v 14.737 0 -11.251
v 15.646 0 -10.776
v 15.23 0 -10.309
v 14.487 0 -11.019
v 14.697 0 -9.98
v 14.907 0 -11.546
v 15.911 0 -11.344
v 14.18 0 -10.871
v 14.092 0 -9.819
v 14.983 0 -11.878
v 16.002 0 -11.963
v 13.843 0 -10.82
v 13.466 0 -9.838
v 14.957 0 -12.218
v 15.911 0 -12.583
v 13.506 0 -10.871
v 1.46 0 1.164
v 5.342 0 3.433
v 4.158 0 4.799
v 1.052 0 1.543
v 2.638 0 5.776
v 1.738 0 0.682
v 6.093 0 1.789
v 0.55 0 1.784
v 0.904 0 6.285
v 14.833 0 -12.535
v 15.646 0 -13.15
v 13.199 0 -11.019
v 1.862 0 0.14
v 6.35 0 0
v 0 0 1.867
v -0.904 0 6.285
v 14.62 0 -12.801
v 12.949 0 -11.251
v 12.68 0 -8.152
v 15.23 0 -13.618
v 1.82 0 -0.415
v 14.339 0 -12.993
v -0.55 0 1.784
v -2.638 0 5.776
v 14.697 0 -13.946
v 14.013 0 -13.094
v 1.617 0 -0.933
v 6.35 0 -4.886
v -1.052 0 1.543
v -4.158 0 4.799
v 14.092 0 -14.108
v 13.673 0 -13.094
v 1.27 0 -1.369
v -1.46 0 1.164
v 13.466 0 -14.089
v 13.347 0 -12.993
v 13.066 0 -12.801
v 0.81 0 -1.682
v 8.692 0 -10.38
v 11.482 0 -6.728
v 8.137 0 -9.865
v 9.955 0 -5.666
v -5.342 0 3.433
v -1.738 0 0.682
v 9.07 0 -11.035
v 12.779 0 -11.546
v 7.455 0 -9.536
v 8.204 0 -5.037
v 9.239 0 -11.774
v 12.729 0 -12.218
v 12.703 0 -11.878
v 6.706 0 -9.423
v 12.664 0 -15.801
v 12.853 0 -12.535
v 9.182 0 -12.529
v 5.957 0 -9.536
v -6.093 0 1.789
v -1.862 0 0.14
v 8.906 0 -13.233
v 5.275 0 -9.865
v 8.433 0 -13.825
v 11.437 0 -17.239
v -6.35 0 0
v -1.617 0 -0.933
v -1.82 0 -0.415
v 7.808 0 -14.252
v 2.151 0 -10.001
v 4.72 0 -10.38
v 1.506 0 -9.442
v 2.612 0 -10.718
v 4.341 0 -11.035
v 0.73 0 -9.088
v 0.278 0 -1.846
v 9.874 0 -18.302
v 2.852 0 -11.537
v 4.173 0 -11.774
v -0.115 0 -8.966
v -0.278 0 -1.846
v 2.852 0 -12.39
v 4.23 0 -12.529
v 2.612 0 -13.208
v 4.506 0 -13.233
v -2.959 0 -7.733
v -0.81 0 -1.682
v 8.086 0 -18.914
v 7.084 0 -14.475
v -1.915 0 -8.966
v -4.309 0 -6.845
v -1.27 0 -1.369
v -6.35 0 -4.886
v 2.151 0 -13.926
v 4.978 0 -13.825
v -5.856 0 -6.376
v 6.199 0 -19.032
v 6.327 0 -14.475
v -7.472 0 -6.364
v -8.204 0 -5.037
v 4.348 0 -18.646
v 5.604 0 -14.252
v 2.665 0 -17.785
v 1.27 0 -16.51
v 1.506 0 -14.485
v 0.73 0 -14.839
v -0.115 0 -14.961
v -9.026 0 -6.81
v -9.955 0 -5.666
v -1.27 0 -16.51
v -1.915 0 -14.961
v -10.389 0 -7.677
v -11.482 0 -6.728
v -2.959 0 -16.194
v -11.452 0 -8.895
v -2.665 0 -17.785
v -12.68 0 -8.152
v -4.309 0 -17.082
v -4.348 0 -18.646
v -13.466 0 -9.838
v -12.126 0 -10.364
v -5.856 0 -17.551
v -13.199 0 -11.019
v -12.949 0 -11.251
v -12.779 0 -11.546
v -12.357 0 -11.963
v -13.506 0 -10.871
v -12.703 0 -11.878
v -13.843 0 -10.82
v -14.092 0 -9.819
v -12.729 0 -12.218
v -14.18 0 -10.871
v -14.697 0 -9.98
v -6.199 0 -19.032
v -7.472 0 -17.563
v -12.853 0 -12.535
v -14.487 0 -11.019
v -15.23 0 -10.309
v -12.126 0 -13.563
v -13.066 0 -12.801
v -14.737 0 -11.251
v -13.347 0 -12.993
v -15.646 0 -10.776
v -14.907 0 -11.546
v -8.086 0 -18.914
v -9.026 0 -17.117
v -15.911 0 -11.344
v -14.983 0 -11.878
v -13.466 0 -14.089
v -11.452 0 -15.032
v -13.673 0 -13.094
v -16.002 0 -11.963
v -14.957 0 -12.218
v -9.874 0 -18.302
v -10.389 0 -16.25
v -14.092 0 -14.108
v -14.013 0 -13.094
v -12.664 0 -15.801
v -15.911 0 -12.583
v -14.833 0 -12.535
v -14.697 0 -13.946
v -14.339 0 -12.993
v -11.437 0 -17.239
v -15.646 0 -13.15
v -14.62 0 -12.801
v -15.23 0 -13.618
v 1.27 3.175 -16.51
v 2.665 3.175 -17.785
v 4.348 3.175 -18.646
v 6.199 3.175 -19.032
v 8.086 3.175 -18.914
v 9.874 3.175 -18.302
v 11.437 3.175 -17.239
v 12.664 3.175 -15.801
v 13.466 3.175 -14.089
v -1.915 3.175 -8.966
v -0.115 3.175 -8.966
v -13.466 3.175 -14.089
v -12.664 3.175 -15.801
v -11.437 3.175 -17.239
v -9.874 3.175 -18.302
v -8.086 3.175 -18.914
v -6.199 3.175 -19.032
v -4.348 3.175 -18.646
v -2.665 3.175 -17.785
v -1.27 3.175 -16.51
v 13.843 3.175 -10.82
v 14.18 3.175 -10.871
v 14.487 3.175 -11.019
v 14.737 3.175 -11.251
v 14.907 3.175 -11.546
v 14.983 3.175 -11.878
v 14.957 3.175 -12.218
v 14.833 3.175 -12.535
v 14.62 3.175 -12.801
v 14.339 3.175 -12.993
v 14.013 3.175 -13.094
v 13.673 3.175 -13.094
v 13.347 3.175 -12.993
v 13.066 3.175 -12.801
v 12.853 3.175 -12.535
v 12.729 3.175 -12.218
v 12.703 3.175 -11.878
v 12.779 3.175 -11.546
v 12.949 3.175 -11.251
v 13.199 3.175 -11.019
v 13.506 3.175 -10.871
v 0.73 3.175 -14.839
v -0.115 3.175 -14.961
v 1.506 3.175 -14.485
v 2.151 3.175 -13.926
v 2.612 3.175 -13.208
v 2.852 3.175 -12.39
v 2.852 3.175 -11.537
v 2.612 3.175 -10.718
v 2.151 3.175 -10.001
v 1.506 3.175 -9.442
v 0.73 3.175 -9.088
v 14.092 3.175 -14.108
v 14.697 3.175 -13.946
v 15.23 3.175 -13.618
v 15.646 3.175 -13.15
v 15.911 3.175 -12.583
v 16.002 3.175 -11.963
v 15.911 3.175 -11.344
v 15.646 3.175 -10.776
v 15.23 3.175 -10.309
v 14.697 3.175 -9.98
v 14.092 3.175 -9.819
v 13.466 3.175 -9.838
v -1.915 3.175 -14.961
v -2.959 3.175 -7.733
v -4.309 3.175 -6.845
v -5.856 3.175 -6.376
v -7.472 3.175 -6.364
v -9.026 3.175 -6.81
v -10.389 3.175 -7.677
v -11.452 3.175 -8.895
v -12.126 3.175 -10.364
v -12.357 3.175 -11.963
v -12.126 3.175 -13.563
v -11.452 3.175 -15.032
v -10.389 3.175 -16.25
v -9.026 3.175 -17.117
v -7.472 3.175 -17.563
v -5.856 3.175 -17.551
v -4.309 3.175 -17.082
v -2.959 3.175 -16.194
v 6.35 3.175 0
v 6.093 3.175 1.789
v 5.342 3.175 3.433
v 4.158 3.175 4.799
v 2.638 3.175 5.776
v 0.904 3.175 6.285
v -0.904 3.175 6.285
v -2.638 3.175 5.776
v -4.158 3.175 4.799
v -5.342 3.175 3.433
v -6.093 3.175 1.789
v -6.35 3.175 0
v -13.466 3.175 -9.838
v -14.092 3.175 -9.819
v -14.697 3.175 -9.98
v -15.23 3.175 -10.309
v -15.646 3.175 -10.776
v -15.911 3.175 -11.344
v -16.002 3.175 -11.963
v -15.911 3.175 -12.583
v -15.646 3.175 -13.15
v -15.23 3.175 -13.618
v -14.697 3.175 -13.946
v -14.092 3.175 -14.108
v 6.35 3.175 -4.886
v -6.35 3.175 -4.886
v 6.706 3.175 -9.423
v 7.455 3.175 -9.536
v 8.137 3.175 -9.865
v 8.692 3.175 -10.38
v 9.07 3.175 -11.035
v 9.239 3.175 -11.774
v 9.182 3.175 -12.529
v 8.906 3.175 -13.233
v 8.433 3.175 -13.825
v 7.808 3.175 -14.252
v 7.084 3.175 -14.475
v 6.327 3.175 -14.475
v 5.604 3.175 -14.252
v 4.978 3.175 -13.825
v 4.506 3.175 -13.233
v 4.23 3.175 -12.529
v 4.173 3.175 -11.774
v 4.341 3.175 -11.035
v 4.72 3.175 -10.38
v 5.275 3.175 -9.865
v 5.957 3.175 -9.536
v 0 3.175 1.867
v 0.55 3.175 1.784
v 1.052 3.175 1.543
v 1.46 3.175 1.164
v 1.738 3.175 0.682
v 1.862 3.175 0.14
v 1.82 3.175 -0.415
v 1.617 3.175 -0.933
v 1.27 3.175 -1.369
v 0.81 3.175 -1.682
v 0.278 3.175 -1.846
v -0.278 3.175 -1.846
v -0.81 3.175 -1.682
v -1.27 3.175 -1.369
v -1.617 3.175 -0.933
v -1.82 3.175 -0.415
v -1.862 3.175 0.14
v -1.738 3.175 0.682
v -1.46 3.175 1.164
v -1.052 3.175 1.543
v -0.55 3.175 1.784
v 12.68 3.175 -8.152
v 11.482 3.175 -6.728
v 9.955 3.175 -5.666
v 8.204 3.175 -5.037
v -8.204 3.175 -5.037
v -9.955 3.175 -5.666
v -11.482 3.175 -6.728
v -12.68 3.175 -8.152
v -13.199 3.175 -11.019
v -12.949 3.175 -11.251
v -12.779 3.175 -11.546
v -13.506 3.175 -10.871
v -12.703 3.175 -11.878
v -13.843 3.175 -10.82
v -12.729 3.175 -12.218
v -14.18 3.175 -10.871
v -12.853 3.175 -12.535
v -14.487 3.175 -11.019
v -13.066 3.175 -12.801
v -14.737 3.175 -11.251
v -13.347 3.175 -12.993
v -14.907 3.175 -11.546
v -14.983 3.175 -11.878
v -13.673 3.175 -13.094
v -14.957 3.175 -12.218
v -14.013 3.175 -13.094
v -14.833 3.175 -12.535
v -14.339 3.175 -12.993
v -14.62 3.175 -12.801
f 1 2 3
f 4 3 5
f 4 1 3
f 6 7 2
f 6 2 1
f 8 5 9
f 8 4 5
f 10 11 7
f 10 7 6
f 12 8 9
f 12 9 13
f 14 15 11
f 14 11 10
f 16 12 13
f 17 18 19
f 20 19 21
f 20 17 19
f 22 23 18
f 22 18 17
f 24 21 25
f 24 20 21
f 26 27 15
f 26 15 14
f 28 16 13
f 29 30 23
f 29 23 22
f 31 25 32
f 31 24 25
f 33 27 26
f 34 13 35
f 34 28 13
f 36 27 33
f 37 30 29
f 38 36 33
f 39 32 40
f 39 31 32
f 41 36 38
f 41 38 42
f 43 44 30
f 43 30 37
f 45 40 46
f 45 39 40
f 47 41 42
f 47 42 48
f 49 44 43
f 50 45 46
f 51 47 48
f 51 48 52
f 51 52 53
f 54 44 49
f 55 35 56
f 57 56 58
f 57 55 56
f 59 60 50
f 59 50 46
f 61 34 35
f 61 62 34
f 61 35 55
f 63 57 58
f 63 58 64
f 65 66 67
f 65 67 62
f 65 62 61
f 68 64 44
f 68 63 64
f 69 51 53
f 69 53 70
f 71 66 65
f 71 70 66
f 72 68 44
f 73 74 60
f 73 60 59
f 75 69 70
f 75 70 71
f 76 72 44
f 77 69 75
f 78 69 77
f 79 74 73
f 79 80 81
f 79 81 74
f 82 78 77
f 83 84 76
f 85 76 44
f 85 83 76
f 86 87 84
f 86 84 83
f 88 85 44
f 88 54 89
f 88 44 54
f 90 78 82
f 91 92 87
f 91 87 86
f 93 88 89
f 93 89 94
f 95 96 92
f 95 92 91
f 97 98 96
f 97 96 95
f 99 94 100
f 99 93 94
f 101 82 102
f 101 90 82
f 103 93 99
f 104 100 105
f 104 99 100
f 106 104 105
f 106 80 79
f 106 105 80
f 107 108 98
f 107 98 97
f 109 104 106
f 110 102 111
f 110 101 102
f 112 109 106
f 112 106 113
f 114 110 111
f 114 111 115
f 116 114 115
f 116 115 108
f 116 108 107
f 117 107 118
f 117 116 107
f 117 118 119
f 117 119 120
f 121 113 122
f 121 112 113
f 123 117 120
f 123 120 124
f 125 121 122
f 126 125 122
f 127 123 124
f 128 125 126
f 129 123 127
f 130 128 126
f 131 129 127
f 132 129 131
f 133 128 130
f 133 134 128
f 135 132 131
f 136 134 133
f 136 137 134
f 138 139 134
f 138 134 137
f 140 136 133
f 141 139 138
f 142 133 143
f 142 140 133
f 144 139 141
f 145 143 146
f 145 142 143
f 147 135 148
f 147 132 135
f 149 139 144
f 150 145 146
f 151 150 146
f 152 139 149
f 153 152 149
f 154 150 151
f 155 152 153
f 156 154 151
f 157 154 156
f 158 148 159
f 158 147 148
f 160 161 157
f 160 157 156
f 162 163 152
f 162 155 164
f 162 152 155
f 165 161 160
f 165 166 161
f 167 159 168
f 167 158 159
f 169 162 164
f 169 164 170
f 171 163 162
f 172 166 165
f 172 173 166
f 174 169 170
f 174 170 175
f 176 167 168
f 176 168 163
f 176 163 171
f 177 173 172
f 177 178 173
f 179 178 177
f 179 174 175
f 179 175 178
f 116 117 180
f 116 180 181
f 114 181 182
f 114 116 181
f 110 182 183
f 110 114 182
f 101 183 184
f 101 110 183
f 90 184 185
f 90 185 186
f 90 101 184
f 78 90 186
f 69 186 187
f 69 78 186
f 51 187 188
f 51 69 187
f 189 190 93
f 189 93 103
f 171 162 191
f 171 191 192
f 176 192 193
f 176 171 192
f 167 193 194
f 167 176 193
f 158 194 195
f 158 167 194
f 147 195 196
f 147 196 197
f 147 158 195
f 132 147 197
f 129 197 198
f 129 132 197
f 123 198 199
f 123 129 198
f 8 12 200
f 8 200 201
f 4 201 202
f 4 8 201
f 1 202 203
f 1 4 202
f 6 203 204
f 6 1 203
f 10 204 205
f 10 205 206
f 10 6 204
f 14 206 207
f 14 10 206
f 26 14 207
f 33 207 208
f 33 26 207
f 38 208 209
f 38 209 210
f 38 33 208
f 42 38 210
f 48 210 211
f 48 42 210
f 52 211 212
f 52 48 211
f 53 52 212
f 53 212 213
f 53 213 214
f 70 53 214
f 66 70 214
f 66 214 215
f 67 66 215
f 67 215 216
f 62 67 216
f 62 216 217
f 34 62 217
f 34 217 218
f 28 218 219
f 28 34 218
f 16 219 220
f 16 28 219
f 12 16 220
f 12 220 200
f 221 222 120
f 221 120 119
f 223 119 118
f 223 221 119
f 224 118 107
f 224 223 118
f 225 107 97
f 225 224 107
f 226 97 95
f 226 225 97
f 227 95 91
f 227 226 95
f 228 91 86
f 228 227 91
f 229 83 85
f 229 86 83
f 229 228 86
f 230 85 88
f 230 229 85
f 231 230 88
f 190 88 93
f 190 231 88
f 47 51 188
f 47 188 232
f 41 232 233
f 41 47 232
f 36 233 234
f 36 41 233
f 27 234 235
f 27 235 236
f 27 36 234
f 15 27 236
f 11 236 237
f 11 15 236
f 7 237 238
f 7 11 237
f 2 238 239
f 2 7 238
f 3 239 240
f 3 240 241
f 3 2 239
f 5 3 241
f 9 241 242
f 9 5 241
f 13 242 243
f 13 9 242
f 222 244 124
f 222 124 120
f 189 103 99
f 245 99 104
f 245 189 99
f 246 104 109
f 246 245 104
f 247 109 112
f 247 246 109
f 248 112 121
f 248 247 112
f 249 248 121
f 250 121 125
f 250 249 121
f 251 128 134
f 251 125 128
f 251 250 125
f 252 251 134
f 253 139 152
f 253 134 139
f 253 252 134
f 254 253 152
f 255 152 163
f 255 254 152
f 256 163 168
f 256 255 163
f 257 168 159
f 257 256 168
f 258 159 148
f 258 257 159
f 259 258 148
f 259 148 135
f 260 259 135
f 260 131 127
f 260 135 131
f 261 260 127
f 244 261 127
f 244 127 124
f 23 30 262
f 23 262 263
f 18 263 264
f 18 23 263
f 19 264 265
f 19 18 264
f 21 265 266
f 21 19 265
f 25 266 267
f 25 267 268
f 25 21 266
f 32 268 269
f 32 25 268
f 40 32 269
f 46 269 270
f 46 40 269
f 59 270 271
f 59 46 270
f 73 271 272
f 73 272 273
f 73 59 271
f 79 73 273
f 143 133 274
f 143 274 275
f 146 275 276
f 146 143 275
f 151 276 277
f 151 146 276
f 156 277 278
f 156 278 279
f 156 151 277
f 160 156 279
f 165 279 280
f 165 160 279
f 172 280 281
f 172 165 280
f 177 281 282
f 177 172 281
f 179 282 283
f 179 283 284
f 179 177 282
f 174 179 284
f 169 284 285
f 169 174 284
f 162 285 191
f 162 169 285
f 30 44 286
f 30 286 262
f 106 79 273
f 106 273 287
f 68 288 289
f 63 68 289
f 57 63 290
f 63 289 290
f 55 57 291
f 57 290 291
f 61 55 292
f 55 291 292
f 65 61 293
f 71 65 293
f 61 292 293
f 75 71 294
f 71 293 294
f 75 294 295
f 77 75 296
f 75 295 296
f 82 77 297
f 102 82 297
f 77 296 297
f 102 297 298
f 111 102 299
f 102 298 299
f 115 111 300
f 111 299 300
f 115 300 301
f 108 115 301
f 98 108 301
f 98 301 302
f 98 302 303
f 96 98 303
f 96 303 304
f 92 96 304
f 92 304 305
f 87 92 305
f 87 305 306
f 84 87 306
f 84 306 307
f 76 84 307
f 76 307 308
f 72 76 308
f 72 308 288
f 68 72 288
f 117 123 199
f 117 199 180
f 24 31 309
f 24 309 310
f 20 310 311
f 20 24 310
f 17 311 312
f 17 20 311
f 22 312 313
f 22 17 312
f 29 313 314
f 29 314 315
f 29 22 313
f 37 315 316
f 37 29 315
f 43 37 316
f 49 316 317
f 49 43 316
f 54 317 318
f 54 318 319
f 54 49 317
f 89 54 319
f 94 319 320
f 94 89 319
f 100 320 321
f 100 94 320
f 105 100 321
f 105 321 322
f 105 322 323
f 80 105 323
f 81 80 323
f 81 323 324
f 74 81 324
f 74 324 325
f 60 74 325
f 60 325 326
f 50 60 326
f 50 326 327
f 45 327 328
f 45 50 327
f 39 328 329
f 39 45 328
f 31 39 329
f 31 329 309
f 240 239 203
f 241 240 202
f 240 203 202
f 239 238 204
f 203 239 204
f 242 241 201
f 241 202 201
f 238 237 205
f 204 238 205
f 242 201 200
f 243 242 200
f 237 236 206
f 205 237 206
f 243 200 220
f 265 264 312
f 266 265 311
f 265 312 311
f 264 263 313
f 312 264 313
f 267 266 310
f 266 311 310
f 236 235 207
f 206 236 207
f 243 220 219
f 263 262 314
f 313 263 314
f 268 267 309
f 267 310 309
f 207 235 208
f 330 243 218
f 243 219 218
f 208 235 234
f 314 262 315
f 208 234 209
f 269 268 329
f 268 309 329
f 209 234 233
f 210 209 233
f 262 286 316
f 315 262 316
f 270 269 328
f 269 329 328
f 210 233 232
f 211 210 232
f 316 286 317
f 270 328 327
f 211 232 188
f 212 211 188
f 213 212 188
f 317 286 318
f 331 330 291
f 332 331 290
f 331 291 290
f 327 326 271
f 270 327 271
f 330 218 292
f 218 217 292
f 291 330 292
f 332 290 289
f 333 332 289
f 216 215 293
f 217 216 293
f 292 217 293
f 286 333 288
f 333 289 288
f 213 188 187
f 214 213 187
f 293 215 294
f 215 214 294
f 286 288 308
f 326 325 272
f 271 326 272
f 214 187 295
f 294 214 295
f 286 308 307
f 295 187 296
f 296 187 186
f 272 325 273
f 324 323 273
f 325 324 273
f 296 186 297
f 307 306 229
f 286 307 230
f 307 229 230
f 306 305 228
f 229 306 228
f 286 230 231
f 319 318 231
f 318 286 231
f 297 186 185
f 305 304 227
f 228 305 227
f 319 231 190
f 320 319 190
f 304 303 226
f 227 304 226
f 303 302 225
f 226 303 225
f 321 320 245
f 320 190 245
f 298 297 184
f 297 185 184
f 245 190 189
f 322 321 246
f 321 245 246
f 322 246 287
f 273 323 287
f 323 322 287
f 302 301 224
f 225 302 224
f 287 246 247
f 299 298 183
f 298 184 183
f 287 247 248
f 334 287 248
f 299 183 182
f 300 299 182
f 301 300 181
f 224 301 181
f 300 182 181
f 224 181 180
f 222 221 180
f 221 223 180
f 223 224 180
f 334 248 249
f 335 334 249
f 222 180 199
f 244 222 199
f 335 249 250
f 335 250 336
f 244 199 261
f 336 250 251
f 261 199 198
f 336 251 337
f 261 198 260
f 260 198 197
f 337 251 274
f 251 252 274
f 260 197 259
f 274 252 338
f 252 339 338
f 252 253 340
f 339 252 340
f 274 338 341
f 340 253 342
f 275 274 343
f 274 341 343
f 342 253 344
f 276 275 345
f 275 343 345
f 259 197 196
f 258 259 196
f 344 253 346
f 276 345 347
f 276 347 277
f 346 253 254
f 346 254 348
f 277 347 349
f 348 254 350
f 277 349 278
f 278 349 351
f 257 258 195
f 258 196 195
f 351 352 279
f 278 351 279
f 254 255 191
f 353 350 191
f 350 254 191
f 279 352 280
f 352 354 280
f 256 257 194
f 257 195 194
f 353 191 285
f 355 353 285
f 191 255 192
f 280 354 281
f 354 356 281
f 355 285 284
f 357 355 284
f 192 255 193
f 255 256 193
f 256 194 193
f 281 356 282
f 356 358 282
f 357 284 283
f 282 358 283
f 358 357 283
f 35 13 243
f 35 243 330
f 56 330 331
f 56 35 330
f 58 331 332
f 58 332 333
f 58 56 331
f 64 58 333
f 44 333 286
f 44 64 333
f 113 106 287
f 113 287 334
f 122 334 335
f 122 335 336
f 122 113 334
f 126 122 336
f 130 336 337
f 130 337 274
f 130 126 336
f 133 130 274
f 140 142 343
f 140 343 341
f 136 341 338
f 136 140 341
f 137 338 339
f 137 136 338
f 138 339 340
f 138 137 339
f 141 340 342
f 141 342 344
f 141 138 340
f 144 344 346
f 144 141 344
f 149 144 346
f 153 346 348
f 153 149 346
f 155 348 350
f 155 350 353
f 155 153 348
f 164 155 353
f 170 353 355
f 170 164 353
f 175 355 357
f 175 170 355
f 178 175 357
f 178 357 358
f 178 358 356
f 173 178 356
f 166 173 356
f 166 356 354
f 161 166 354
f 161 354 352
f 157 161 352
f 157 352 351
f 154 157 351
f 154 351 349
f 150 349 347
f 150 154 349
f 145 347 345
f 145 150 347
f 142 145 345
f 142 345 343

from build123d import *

# Parameters (mm, degrees)
SKETCH1_R           = 1.143
SKETCH1_R_2         = 1.8669
BOSS_EXTRUDE1_DEPTH = 3.175
SKETCH2_R           = 2.54
CUT_EXTRUDE1_DEPTH  = 26.080811969


with BuildPart() as part:
    # Sketch1 → Boss-Extrude1 (new body)
    with BuildSketch(Plane(origin=(0, 0, 0), x_dir=(1, 0, 0), z_dir=(0, 1, 0))):
        with BuildLine():
            ThreePointArc((13.466066475, 14.089241508), (16.002, 11.9634), (13.466066475, 9.837558492))
            ThreePointArc((13.466066475, 9.837558492), (10.753575803, 6.146552641), (6.35, 4.885739418))
            Line((6.35, 4.885739418), (6.35, 0))
            ThreePointArc((6.35, 0), (0, -6.35), (-6.35, 0))
            Line((-6.35, 0), (-6.35, 4.885739418))
            ThreePointArc((-6.35, 4.885739418), (-10.753575803, 6.146552641), (-13.466066475, 9.837558492))
            ThreePointArc((-13.466066475, 9.837558492), (-16.002, 11.9634), (-13.466066475, 14.089241508))
            ThreePointArc((-13.466066475, 14.089241508), (-8.085518963, 18.914398366), (-1.27, 16.51))
            Line((-1.27, 16.51), (1.27, 16.51))
            ThreePointArc((1.27, 16.51), (8.085518963, 18.914398366), (13.466066475, 14.089241508))
        make_face()
        with Locations(Location((13.843, 11.9634, 0), (0, 0, 270))):
            Circle(SKETCH1_R, mode=Mode.SUBTRACT)
        with Locations(Location((-13.843, 11.9634, 0), (0, 0, 270))):
            Circle(SKETCH1_R, mode=Mode.SUBTRACT)
        with Locations(Location((0, 0, 0), (0, 0, 270))):
            Circle(SKETCH1_R_2, mode=Mode.SUBTRACT)
    extrude(amount=BOSS_EXTRUDE1_DEPTH)

    # Sketch2 → Cut-Extrude1 (cut, through all)
    with BuildSketch(Plane(origin=(0, 3.175, 0), x_dir=(1, 0, 0), z_dir=(0, 1, 0))):
        with Locations(Location((6.705837378, 11.9634, 0), (0, 0, 270))):
            Circle(SKETCH2_R)
        with BuildLine():
            Line((-0.114537378, 8.9662), (-1.914569862, 8.9662))
            ThreePointArc((-1.914569862, 8.9662), (-12.357337378, 11.9634), (-1.914569862, 14.9606))
            Line((-1.914569862, 14.9606), (-0.114537378, 14.9606))
            ThreePointArc((-0.114537378, 14.9606), (2.882662622, 11.9634), (-0.114537378, 8.9662))
        make_face()
    extrude(amount=-CUT_EXTRUDE1_DEPTH, mode=Mode.SUBTRACT)


solid = part.part
